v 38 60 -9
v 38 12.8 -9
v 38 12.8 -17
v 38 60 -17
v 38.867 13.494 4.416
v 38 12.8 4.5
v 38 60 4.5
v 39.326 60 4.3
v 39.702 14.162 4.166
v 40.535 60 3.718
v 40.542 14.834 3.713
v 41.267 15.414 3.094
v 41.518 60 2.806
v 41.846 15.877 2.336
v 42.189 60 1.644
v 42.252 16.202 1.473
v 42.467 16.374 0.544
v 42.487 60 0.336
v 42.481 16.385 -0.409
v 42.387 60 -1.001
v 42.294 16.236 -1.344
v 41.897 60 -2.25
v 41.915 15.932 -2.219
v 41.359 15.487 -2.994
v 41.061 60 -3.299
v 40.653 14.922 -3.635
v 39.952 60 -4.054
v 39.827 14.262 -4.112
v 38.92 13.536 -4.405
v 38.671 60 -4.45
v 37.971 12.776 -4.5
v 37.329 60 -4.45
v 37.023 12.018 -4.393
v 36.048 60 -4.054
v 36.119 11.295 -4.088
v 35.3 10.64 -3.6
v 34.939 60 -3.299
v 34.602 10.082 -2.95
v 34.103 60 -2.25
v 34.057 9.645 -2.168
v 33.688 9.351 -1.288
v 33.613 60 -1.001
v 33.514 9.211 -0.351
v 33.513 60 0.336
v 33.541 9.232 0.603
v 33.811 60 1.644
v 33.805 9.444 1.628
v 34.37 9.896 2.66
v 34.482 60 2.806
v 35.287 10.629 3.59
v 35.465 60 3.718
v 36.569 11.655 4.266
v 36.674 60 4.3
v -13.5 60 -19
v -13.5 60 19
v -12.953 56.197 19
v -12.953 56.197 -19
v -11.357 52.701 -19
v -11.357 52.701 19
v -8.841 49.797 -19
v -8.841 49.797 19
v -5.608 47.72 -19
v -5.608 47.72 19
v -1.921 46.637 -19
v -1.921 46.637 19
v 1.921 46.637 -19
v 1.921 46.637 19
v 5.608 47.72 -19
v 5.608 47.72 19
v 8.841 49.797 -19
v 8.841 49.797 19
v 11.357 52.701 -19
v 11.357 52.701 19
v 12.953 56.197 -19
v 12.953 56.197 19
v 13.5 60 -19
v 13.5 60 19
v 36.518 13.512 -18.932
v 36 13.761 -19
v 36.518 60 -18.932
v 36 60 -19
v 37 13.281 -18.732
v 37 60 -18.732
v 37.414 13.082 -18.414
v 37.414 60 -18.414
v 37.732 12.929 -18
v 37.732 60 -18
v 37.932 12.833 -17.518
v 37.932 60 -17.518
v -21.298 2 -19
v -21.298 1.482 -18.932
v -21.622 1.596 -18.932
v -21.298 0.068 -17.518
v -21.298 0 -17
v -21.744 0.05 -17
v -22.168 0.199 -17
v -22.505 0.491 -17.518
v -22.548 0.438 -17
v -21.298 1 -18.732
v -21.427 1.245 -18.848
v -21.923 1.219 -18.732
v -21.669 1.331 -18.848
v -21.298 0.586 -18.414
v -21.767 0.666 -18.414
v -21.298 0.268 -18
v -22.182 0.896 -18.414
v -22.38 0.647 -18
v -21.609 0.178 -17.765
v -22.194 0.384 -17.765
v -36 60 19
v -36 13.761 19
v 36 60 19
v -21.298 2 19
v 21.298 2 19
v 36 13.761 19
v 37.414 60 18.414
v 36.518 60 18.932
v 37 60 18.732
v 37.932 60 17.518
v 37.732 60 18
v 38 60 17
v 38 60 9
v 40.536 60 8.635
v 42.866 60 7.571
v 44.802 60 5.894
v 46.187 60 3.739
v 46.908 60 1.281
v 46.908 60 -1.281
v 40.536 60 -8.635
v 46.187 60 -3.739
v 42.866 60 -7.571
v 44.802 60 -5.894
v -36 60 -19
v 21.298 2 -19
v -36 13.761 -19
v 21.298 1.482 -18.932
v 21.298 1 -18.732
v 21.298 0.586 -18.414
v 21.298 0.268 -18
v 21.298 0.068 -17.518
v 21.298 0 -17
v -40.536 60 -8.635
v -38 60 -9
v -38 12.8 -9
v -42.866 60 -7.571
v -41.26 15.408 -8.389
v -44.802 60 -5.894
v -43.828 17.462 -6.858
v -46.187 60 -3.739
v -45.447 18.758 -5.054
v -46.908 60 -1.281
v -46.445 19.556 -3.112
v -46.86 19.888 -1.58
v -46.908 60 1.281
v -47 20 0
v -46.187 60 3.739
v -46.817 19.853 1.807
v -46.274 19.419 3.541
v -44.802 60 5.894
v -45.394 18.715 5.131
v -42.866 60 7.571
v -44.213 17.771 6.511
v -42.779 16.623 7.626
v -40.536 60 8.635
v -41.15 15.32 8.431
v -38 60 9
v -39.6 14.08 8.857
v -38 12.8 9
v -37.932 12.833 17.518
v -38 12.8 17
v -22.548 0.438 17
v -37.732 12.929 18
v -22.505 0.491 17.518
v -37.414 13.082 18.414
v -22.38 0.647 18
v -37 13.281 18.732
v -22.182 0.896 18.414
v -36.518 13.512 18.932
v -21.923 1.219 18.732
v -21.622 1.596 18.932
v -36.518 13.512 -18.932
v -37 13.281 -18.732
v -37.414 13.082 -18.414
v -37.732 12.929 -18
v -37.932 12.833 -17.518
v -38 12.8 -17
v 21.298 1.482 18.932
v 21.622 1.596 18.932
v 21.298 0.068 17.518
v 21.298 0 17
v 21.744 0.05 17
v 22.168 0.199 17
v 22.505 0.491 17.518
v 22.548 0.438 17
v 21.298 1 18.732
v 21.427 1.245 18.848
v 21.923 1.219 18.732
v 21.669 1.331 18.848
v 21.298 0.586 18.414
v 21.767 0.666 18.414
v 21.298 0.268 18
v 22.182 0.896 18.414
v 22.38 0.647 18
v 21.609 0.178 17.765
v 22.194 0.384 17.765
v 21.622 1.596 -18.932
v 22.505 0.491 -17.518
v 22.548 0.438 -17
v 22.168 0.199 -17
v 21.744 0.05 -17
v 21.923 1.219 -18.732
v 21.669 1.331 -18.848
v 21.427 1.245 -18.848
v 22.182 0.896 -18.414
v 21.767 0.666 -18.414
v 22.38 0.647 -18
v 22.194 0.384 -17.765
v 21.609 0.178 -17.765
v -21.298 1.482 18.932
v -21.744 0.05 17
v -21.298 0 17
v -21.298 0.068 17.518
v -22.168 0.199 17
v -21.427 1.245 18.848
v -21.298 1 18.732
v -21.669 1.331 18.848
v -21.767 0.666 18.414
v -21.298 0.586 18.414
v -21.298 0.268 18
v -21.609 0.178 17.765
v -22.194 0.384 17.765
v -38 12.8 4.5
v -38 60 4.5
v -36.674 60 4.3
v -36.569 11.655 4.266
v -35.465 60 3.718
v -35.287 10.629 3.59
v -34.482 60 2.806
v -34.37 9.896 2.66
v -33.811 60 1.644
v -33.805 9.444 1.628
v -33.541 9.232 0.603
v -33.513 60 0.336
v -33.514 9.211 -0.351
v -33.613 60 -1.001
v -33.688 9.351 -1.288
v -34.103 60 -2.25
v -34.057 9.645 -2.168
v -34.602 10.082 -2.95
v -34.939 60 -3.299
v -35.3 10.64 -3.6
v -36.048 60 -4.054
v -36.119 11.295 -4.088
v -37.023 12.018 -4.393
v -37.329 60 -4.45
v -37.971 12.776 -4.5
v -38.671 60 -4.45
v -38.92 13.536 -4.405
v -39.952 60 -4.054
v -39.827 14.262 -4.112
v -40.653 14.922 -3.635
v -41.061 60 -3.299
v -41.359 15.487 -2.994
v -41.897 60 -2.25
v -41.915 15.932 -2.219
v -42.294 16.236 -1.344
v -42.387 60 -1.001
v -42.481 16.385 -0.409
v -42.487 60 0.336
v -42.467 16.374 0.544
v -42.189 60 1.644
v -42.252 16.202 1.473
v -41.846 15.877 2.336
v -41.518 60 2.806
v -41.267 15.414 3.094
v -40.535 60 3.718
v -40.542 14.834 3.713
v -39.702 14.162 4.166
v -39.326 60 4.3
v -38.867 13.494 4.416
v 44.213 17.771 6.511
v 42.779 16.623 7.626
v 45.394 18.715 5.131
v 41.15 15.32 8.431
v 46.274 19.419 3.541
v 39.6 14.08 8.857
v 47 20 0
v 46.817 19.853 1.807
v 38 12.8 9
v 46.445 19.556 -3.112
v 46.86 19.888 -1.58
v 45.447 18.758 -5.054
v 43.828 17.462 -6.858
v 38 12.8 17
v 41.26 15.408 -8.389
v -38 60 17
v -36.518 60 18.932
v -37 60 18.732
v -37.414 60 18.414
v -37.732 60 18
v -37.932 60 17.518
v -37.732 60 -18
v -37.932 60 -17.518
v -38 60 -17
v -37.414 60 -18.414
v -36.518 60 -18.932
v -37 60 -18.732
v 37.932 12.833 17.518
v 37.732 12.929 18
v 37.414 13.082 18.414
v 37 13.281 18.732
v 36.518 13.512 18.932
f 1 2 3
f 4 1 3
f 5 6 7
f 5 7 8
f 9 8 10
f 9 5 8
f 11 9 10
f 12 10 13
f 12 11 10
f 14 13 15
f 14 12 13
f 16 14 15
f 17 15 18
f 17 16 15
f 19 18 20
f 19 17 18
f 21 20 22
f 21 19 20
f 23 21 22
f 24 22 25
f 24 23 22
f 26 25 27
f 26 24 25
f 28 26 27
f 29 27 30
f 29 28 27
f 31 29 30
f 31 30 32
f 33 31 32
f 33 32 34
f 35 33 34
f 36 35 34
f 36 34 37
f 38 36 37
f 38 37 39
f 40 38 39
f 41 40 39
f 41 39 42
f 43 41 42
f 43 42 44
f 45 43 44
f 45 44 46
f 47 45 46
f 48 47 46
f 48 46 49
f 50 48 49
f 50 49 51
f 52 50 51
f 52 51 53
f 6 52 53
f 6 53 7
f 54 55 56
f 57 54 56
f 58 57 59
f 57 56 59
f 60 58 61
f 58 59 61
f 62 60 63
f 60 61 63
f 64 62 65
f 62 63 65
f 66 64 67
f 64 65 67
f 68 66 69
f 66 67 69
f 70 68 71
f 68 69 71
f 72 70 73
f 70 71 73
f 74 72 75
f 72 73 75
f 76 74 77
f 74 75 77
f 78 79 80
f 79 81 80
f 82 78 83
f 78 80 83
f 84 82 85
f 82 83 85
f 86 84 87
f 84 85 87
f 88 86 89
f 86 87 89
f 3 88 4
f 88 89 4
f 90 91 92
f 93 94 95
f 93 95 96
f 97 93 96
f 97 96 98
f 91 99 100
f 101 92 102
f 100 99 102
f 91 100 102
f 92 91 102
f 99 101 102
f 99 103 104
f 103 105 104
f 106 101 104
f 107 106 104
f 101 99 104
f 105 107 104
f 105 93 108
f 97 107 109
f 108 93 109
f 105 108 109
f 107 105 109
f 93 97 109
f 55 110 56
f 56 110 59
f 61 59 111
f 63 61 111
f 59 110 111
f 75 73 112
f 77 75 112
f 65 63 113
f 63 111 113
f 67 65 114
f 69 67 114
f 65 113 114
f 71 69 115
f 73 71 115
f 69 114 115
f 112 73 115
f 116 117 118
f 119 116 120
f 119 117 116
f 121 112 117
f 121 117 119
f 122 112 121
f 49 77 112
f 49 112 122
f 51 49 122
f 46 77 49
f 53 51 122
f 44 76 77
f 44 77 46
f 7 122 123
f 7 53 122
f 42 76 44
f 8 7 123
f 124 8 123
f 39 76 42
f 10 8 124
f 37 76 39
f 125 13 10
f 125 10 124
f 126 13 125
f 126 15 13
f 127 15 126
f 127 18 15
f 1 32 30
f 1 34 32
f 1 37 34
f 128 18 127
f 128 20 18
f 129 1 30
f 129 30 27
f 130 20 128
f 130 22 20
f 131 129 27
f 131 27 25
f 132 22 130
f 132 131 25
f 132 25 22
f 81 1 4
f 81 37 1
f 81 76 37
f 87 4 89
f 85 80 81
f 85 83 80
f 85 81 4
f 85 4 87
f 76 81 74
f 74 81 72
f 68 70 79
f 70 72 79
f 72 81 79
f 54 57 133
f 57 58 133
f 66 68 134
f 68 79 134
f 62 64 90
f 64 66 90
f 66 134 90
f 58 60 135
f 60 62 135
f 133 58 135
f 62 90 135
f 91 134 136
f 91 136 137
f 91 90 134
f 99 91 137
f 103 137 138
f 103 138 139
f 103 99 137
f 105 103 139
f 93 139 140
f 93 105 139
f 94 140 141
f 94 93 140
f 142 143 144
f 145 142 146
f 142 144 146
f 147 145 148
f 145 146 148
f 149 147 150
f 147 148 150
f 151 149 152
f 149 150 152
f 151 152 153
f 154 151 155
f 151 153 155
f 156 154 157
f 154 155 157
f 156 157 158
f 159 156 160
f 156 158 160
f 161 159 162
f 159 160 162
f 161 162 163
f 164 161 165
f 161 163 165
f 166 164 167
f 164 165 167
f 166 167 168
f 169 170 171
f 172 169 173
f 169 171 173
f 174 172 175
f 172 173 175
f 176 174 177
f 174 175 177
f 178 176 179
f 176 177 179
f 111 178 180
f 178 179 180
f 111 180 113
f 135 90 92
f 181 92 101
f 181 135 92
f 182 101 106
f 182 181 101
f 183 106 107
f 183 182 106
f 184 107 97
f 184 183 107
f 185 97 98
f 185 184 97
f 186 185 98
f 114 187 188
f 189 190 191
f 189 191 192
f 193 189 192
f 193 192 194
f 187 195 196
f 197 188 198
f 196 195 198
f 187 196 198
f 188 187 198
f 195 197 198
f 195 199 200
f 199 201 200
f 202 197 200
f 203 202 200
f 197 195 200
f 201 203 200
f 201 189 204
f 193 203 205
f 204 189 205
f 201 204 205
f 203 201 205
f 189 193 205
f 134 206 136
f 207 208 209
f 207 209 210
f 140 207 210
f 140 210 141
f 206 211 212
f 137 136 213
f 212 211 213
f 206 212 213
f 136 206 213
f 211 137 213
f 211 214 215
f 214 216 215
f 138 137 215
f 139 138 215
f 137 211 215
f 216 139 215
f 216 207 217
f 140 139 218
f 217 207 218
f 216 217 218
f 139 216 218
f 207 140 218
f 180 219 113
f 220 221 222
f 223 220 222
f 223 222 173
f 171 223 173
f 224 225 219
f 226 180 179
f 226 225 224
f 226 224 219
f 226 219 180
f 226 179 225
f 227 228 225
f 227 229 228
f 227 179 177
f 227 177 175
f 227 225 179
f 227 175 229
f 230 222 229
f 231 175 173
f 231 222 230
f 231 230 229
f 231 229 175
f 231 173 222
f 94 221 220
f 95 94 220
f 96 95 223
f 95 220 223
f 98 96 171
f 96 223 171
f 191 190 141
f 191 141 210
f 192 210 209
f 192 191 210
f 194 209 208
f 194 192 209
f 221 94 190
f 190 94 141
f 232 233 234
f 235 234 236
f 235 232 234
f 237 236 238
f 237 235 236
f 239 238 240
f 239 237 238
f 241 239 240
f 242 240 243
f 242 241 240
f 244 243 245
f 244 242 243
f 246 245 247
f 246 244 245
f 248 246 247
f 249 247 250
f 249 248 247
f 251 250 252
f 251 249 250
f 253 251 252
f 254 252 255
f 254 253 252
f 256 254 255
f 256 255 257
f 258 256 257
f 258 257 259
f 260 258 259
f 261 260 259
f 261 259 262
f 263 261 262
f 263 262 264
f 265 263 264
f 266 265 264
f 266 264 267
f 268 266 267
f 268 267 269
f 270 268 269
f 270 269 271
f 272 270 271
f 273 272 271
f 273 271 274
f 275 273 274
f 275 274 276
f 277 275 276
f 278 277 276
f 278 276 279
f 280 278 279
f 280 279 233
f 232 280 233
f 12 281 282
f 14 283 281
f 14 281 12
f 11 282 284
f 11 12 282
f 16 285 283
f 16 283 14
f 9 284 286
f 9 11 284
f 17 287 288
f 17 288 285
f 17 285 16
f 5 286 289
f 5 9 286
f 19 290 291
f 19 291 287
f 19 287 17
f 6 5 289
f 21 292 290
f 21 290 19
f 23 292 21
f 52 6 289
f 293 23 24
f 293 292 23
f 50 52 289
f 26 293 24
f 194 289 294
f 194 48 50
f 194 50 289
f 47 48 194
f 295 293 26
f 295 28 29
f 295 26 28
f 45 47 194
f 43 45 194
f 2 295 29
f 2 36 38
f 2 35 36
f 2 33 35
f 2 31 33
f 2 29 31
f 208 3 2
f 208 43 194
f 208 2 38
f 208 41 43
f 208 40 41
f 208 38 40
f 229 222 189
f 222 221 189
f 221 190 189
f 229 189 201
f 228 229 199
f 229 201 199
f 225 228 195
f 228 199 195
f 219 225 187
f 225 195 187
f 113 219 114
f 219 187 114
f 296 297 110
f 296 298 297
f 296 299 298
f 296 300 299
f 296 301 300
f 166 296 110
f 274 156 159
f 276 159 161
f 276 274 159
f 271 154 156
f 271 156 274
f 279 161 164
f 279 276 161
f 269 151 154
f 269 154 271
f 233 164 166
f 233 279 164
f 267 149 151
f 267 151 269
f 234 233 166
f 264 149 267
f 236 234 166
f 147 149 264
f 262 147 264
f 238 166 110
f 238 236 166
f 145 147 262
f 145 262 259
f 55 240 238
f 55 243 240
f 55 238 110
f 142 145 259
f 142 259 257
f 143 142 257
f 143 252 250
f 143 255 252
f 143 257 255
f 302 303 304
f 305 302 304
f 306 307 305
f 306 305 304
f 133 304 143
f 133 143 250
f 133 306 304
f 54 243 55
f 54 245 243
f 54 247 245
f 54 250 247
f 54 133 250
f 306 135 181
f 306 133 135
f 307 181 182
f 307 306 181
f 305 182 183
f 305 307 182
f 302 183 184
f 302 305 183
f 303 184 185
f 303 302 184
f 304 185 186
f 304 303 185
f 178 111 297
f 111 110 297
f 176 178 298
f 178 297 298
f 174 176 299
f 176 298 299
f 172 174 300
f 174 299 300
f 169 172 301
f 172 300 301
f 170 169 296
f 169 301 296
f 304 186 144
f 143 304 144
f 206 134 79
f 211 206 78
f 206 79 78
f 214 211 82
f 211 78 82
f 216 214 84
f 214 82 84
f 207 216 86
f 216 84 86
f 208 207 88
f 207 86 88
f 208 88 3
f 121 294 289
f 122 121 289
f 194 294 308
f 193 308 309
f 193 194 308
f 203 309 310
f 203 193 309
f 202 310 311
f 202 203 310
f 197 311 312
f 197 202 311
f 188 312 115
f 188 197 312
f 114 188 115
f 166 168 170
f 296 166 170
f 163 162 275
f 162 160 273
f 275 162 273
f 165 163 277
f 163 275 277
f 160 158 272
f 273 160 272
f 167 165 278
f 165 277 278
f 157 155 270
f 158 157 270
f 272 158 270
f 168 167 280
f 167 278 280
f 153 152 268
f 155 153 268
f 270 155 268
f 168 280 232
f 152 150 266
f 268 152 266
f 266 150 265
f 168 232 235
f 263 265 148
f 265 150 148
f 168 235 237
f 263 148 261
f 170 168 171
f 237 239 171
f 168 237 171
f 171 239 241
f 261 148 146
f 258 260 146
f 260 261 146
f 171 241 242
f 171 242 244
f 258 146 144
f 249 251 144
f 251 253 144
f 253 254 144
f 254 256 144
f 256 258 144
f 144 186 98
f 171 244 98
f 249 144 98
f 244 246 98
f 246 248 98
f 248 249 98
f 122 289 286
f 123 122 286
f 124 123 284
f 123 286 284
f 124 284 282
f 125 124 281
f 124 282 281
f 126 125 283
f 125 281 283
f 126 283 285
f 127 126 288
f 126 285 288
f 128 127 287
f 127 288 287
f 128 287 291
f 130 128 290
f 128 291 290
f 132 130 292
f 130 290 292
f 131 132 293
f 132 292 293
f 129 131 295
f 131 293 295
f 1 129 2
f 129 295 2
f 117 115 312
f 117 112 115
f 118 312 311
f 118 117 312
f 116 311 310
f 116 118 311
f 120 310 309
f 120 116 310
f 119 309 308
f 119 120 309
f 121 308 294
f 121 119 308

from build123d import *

# Parameters (mm, degrees)
ESBO_O2_R                  = 4.5
RESSALTO_EXTRUS_O1_DEPTH   = 60
CORTE_EXTRUS_O1_DEPTH      = 86.164546614
CORTE_EXTRUS_O6_DEPTH      = 79.549347547
CORTE_EXTRUS_O6_DEPTH_BACK = 79.549347547
CORTE_EXTRUS_O7_DEPTH      = 79.549347547
CORTE_EXTRUS_O7_DEPTH_BACK = 79.549347547
FILETE1_R                  = 2


with BuildPart() as part:
    # Esboço2 → Ressalto-extrusão1 (new body)
    with BuildSketch(Plane(origin=(0, 0, 0), x_dir=(1, 0, 0), z_dir=(0, 1, 0))):
        with BuildLine():
            Line((38, 19), (-38, 19))
            Line((-38, 19), (-38, 9))
            ThreePointArc((-38, 9), (-47, 0), (-38, -9))
            Line((-38, -9), (-38, -19))
            Line((-38, -19), (38, -19))
            Line((38, -19), (38, -9))
            ThreePointArc((38, -9), (47, 0), (38, 9))
            Line((38, 9), (38, 19))
        make_face()
        with Locations(Location((-38, 0, 0), (0, 0, 270))):
            Circle(ESBO_O2_R, mode=Mode.SUBTRACT)
        with Locations(Location((38, 0, 0), (0, 0, 270))):
            Circle(ESBO_O2_R, mode=Mode.SUBTRACT)
    extrude(amount=RESSALTO_EXTRUS_O1_DEPTH)

    # Esboço3 → Corte-extrusão1 (cut, through all)
    with BuildSketch(Plane.XY.offset(19)):
        with BuildLine():
            Line((13.5, 60), (-13.5, 60))
            ThreePointArc((-13.5, 60), (0, 46.5), (13.5, 60))
        make_face()
    extrude(amount=-CORTE_EXTRUS_O1_DEPTH, mode=Mode.SUBTRACT)

    # Esboço4 → Corte-extrusão6 (cut, two sides: drawn at the far end of the back side and taken through both)
    with BuildSketch(Plane.XY.offset(-CORTE_EXTRUS_O6_DEPTH_BACK)):
        Polygon((-214.350715587, 153.88057247), (-47, 20), (-22, 0), (145.350715587, -133.88057247), (-122.410429352, -468.582003645), (-482.111860527, -180.820858705), align=None)
    extrude(amount=CORTE_EXTRUS_O6_DEPTH + CORTE_EXTRUS_O6_DEPTH_BACK, mode=Mode.SUBTRACT)

    # Esboço5 → Corte-extrusão7 (cut, two sides: drawn at the far end of the back side and taken through both)
    with BuildSketch(Plane.XY.offset(-CORTE_EXTRUS_O7_DEPTH_BACK)):
        Polygon((214.350715587, 153.88057247), (47, 20), (22, 0), (-145.350715587, -133.88057247), (122.410429352, -468.582003645), (482.111860527, -180.820858705), align=None)
    extrude(amount=CORTE_EXTRUS_O7_DEPTH + CORTE_EXTRUS_O7_DEPTH_BACK, mode=Mode.SUBTRACT)

    # Filete1
    filete1_edges = [part.edges().sort_by_distance(p)[0] for p in [
        (-38, 36.4, -19),
        (38, 36.4, -19),
        (38, 36.4, 19),
        (-38, 36.4, 19),
        (0, 0, -19),
        (0, 0, 19),
        (-30, 6.4, -19),
        (-30, 6.4, 19),
        (-22, 0, 0),
        (30, 6.4, 19),
        (22, 0, 0),
        (30, 6.4, -19),
    ]]
    fillet(filete1_edges, radius=FILETE1_R)


solid = part.part
